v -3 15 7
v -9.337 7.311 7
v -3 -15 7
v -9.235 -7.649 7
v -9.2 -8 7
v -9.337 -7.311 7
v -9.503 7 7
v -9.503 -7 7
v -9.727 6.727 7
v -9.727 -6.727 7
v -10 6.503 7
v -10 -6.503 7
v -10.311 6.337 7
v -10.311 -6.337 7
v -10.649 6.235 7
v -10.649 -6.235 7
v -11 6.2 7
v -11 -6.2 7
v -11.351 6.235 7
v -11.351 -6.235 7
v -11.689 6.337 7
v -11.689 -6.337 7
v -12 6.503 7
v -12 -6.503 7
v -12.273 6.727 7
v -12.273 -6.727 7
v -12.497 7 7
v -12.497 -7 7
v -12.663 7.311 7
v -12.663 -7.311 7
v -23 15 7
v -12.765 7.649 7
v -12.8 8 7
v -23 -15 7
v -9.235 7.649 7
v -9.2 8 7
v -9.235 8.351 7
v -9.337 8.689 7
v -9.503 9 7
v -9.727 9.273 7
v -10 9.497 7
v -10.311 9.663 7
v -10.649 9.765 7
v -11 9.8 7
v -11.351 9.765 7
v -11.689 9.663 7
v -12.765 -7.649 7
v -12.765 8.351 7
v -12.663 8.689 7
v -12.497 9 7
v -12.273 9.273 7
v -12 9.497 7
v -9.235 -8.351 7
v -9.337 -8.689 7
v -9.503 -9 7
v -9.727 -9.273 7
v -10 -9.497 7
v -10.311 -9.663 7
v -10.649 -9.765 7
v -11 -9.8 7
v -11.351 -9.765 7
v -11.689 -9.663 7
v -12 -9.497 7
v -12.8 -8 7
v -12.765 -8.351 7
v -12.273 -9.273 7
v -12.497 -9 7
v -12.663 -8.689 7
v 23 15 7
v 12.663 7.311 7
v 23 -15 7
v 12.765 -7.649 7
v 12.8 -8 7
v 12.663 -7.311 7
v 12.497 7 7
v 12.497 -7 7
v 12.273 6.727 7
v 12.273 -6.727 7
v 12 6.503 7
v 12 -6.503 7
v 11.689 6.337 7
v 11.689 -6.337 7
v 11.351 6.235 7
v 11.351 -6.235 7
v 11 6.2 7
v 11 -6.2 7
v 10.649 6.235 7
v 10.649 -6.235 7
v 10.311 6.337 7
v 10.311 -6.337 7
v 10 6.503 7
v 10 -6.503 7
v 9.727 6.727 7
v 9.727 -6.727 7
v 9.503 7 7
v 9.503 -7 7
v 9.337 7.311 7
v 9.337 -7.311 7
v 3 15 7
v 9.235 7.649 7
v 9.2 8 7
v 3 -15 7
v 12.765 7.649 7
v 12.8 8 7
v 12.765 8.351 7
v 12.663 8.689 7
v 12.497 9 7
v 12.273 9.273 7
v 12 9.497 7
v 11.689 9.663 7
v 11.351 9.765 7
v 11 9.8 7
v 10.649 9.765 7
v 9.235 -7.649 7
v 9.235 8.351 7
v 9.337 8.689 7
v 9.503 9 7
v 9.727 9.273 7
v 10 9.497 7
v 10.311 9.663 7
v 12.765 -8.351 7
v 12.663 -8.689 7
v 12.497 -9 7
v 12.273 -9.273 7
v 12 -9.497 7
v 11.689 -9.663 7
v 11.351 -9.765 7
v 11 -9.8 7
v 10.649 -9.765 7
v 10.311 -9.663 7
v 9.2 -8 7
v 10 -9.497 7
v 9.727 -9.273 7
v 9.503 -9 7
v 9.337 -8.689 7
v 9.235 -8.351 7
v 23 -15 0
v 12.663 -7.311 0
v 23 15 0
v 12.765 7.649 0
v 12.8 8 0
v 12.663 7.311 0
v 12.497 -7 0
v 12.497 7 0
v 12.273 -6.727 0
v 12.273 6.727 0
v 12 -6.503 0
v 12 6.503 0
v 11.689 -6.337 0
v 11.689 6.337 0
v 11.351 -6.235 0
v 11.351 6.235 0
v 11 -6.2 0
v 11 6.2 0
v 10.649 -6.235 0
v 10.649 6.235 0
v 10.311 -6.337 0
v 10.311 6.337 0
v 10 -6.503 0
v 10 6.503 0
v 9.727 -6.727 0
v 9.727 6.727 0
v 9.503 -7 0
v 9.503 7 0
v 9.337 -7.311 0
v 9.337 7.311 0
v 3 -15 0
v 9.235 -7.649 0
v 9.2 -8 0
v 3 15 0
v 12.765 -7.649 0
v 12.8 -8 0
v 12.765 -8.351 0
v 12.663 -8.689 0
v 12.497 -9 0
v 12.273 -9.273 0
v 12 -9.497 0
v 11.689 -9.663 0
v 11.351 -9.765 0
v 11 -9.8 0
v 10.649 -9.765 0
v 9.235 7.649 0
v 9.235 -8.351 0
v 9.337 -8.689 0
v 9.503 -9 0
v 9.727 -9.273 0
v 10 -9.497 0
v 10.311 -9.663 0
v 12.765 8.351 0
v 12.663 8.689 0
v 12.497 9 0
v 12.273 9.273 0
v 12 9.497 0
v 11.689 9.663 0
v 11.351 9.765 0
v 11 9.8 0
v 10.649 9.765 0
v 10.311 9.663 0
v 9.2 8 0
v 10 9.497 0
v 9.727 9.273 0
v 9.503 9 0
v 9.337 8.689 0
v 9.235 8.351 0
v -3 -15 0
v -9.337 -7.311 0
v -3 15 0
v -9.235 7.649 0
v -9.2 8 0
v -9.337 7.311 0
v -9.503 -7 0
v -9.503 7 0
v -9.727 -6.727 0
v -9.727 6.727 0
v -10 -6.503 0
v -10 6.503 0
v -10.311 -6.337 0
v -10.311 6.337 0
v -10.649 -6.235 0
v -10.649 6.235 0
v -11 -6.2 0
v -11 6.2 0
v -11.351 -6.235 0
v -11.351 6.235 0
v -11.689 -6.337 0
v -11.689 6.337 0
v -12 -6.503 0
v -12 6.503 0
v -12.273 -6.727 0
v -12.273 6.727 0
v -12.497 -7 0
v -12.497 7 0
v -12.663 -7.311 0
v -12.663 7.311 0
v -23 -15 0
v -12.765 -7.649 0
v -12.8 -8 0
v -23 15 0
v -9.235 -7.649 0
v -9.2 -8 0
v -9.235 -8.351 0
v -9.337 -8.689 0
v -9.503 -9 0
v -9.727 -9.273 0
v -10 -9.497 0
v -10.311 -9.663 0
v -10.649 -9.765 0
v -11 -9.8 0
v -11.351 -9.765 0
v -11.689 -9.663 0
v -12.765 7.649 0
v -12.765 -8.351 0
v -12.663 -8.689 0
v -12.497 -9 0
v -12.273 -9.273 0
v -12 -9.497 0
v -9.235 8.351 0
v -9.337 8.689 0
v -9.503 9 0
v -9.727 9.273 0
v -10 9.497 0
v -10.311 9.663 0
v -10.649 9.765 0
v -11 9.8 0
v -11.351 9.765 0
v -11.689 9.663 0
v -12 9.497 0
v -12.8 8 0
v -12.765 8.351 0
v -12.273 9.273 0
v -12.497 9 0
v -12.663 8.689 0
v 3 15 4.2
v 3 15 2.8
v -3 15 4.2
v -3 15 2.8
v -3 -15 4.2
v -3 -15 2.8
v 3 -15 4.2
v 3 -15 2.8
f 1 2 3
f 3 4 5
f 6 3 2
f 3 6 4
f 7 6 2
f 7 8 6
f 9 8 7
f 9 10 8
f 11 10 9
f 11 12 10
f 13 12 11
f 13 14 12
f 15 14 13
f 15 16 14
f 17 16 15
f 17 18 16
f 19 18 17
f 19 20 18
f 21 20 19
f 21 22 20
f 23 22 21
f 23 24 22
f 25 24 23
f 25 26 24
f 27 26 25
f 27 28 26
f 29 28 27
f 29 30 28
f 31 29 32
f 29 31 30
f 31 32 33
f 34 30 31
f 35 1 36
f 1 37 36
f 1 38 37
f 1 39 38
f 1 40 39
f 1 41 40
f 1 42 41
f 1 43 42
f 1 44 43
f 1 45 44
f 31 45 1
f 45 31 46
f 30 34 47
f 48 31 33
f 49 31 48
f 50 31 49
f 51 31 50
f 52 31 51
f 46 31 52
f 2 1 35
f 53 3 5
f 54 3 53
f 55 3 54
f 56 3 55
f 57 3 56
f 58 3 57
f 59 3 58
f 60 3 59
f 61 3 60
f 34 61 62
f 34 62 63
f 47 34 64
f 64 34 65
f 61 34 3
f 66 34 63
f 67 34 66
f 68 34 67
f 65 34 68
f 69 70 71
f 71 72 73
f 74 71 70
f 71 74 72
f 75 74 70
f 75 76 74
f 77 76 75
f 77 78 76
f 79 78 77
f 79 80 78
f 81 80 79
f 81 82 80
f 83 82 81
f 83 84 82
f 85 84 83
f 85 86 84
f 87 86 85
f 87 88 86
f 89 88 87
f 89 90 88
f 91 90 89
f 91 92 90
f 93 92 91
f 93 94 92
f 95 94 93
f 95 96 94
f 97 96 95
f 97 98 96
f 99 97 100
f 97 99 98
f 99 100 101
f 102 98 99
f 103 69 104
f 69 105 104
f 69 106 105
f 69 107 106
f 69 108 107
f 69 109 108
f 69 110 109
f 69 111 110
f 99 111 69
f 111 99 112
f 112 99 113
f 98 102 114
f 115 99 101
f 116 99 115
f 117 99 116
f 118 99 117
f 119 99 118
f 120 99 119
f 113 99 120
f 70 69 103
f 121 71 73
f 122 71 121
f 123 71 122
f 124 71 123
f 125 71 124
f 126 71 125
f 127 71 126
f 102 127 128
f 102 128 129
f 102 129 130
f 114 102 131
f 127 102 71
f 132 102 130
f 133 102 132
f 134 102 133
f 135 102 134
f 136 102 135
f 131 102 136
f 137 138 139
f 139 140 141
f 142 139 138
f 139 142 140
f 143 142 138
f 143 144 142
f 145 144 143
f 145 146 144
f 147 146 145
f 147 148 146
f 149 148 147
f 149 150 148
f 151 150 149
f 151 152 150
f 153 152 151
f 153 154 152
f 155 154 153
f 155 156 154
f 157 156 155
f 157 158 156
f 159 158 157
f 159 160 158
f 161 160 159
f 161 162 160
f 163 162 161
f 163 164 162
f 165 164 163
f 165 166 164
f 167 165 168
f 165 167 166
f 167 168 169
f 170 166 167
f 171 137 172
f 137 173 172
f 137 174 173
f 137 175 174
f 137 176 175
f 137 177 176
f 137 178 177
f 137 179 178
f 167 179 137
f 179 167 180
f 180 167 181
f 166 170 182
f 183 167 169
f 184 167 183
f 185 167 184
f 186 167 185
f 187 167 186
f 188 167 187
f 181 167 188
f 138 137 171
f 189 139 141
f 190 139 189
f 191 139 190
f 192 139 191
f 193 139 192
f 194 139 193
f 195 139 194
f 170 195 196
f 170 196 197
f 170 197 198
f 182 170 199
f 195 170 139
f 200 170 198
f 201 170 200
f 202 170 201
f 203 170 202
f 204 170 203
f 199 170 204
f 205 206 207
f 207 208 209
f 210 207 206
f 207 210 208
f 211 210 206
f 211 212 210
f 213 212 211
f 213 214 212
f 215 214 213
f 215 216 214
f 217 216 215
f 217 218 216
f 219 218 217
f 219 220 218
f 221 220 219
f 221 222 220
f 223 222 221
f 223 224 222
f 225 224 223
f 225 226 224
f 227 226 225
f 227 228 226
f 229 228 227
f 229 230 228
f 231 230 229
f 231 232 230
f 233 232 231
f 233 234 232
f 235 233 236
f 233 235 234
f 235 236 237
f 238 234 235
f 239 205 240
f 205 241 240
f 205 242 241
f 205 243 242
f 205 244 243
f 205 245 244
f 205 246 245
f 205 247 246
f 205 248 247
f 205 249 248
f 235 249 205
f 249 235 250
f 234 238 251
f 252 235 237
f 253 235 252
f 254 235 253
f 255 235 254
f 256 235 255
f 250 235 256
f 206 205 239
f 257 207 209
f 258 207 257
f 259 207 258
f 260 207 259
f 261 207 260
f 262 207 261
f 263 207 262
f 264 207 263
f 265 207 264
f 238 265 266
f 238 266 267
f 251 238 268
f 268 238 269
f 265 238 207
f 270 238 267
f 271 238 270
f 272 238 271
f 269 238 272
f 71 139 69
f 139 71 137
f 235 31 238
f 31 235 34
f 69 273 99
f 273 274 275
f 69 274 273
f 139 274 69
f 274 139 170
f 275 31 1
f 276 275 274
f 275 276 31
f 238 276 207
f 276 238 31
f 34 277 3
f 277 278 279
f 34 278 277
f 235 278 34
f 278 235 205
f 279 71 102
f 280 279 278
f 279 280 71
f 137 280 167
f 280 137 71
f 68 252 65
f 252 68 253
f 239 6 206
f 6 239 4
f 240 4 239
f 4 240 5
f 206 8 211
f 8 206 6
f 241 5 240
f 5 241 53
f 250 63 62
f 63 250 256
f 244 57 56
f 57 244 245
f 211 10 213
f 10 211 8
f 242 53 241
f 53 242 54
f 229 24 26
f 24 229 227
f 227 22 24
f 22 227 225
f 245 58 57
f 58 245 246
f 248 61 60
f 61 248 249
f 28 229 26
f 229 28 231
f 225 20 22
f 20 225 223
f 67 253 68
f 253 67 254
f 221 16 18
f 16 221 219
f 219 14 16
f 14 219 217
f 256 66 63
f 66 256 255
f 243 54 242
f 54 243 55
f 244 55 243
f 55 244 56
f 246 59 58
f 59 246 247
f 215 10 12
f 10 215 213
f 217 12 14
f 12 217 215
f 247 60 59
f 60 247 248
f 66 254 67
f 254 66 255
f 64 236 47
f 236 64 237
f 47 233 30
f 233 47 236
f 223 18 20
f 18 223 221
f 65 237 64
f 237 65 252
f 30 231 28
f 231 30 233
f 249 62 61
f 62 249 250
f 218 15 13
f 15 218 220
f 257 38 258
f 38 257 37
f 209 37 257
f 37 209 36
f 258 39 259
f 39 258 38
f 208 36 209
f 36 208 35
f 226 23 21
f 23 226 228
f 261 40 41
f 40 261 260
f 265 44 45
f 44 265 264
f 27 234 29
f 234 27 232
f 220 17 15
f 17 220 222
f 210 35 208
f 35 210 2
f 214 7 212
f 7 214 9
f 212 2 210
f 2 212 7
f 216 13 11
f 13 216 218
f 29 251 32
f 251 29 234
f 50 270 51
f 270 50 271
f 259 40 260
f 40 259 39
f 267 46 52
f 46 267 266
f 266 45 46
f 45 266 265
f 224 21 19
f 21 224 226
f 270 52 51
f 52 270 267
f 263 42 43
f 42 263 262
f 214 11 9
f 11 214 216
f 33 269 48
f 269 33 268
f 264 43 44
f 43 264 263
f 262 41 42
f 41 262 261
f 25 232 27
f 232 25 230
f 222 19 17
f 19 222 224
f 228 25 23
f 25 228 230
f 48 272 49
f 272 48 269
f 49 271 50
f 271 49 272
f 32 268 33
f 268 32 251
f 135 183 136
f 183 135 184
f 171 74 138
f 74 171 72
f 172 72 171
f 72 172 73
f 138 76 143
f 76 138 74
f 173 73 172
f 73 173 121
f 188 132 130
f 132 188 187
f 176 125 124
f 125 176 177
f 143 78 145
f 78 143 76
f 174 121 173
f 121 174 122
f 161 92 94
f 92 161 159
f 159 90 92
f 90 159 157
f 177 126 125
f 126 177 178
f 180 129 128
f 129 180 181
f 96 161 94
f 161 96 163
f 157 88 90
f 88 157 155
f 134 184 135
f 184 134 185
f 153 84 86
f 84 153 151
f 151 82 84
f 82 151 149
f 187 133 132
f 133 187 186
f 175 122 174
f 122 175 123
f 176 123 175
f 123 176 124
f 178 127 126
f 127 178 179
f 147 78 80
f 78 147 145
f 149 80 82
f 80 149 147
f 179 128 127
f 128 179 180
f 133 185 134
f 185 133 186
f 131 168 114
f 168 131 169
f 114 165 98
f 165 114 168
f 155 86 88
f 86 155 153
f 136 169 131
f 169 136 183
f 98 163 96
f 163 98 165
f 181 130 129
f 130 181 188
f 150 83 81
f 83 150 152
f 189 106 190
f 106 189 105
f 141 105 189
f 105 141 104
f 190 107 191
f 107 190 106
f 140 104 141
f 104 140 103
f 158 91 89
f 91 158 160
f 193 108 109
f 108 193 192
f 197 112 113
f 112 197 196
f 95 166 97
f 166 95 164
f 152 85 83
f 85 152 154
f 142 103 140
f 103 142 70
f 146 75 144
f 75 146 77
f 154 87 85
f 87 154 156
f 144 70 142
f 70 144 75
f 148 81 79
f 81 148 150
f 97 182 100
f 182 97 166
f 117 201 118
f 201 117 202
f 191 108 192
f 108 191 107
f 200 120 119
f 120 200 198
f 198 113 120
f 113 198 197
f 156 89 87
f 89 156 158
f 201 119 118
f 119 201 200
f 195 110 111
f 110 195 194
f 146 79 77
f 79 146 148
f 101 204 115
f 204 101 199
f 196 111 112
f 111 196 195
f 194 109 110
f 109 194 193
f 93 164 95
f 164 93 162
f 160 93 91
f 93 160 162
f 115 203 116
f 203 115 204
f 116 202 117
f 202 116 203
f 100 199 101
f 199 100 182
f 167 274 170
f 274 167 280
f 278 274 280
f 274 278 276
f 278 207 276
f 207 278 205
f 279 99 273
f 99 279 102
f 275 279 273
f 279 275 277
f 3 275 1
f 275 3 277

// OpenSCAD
$fn = 32;

// ----------------------------------------------------------------------
// Living hinge: 46 x 30 mm plates, 1.4 mm flexible web
// ----------------------------------------------------------------------

// --- parameters (mm) ---
plate_len = 20;           // plate length outside the web
plate_w = 30;             // plate width
thick = 7;                // plate thickness
web_half = 3;             // half width of the flex band
web_t = 1.4;              // flexible web thickness
web_z = 2.8;              // web position inside the thickness
boss_d = 10;              // screw boss diameter
boss_h = 7;               // screw boss height
boss_x = 11;              // screw boss distance from the web
screw_d = 3.6;            // screw hole

difference() {
  union() {
    /* one flat strip, later thinned at the middle */
    translate([-23, -15, 0]) cube([46, 30, 7]);
    /* screw bosses, sunk 0.5 mm into the plates */
    for (sx = [-11, 11]) {
      for (sy = [-8, 8]) {
        translate([sx, sy, 0]) cylinder(h = boss_h, d = boss_d);
      }
    }
  }
  /* channel from below: leaves the web on top of it */
  translate([-3, -17.5, -2.5]) cube([6, 35, 5.3]);
  /* channel from above: thins the web down to web_t */
  translate([-3, -17.5, 4.2]) cube([6, 35, 5.3]);
  /* screw holes through the bosses */
  for (sx = [-11, 11]) {
    for (sy = [-8, 8]) {
      translate([sx, sy, -2.5]) cylinder(h = boss_h + 5, d = screw_d);
    }
  }
}
